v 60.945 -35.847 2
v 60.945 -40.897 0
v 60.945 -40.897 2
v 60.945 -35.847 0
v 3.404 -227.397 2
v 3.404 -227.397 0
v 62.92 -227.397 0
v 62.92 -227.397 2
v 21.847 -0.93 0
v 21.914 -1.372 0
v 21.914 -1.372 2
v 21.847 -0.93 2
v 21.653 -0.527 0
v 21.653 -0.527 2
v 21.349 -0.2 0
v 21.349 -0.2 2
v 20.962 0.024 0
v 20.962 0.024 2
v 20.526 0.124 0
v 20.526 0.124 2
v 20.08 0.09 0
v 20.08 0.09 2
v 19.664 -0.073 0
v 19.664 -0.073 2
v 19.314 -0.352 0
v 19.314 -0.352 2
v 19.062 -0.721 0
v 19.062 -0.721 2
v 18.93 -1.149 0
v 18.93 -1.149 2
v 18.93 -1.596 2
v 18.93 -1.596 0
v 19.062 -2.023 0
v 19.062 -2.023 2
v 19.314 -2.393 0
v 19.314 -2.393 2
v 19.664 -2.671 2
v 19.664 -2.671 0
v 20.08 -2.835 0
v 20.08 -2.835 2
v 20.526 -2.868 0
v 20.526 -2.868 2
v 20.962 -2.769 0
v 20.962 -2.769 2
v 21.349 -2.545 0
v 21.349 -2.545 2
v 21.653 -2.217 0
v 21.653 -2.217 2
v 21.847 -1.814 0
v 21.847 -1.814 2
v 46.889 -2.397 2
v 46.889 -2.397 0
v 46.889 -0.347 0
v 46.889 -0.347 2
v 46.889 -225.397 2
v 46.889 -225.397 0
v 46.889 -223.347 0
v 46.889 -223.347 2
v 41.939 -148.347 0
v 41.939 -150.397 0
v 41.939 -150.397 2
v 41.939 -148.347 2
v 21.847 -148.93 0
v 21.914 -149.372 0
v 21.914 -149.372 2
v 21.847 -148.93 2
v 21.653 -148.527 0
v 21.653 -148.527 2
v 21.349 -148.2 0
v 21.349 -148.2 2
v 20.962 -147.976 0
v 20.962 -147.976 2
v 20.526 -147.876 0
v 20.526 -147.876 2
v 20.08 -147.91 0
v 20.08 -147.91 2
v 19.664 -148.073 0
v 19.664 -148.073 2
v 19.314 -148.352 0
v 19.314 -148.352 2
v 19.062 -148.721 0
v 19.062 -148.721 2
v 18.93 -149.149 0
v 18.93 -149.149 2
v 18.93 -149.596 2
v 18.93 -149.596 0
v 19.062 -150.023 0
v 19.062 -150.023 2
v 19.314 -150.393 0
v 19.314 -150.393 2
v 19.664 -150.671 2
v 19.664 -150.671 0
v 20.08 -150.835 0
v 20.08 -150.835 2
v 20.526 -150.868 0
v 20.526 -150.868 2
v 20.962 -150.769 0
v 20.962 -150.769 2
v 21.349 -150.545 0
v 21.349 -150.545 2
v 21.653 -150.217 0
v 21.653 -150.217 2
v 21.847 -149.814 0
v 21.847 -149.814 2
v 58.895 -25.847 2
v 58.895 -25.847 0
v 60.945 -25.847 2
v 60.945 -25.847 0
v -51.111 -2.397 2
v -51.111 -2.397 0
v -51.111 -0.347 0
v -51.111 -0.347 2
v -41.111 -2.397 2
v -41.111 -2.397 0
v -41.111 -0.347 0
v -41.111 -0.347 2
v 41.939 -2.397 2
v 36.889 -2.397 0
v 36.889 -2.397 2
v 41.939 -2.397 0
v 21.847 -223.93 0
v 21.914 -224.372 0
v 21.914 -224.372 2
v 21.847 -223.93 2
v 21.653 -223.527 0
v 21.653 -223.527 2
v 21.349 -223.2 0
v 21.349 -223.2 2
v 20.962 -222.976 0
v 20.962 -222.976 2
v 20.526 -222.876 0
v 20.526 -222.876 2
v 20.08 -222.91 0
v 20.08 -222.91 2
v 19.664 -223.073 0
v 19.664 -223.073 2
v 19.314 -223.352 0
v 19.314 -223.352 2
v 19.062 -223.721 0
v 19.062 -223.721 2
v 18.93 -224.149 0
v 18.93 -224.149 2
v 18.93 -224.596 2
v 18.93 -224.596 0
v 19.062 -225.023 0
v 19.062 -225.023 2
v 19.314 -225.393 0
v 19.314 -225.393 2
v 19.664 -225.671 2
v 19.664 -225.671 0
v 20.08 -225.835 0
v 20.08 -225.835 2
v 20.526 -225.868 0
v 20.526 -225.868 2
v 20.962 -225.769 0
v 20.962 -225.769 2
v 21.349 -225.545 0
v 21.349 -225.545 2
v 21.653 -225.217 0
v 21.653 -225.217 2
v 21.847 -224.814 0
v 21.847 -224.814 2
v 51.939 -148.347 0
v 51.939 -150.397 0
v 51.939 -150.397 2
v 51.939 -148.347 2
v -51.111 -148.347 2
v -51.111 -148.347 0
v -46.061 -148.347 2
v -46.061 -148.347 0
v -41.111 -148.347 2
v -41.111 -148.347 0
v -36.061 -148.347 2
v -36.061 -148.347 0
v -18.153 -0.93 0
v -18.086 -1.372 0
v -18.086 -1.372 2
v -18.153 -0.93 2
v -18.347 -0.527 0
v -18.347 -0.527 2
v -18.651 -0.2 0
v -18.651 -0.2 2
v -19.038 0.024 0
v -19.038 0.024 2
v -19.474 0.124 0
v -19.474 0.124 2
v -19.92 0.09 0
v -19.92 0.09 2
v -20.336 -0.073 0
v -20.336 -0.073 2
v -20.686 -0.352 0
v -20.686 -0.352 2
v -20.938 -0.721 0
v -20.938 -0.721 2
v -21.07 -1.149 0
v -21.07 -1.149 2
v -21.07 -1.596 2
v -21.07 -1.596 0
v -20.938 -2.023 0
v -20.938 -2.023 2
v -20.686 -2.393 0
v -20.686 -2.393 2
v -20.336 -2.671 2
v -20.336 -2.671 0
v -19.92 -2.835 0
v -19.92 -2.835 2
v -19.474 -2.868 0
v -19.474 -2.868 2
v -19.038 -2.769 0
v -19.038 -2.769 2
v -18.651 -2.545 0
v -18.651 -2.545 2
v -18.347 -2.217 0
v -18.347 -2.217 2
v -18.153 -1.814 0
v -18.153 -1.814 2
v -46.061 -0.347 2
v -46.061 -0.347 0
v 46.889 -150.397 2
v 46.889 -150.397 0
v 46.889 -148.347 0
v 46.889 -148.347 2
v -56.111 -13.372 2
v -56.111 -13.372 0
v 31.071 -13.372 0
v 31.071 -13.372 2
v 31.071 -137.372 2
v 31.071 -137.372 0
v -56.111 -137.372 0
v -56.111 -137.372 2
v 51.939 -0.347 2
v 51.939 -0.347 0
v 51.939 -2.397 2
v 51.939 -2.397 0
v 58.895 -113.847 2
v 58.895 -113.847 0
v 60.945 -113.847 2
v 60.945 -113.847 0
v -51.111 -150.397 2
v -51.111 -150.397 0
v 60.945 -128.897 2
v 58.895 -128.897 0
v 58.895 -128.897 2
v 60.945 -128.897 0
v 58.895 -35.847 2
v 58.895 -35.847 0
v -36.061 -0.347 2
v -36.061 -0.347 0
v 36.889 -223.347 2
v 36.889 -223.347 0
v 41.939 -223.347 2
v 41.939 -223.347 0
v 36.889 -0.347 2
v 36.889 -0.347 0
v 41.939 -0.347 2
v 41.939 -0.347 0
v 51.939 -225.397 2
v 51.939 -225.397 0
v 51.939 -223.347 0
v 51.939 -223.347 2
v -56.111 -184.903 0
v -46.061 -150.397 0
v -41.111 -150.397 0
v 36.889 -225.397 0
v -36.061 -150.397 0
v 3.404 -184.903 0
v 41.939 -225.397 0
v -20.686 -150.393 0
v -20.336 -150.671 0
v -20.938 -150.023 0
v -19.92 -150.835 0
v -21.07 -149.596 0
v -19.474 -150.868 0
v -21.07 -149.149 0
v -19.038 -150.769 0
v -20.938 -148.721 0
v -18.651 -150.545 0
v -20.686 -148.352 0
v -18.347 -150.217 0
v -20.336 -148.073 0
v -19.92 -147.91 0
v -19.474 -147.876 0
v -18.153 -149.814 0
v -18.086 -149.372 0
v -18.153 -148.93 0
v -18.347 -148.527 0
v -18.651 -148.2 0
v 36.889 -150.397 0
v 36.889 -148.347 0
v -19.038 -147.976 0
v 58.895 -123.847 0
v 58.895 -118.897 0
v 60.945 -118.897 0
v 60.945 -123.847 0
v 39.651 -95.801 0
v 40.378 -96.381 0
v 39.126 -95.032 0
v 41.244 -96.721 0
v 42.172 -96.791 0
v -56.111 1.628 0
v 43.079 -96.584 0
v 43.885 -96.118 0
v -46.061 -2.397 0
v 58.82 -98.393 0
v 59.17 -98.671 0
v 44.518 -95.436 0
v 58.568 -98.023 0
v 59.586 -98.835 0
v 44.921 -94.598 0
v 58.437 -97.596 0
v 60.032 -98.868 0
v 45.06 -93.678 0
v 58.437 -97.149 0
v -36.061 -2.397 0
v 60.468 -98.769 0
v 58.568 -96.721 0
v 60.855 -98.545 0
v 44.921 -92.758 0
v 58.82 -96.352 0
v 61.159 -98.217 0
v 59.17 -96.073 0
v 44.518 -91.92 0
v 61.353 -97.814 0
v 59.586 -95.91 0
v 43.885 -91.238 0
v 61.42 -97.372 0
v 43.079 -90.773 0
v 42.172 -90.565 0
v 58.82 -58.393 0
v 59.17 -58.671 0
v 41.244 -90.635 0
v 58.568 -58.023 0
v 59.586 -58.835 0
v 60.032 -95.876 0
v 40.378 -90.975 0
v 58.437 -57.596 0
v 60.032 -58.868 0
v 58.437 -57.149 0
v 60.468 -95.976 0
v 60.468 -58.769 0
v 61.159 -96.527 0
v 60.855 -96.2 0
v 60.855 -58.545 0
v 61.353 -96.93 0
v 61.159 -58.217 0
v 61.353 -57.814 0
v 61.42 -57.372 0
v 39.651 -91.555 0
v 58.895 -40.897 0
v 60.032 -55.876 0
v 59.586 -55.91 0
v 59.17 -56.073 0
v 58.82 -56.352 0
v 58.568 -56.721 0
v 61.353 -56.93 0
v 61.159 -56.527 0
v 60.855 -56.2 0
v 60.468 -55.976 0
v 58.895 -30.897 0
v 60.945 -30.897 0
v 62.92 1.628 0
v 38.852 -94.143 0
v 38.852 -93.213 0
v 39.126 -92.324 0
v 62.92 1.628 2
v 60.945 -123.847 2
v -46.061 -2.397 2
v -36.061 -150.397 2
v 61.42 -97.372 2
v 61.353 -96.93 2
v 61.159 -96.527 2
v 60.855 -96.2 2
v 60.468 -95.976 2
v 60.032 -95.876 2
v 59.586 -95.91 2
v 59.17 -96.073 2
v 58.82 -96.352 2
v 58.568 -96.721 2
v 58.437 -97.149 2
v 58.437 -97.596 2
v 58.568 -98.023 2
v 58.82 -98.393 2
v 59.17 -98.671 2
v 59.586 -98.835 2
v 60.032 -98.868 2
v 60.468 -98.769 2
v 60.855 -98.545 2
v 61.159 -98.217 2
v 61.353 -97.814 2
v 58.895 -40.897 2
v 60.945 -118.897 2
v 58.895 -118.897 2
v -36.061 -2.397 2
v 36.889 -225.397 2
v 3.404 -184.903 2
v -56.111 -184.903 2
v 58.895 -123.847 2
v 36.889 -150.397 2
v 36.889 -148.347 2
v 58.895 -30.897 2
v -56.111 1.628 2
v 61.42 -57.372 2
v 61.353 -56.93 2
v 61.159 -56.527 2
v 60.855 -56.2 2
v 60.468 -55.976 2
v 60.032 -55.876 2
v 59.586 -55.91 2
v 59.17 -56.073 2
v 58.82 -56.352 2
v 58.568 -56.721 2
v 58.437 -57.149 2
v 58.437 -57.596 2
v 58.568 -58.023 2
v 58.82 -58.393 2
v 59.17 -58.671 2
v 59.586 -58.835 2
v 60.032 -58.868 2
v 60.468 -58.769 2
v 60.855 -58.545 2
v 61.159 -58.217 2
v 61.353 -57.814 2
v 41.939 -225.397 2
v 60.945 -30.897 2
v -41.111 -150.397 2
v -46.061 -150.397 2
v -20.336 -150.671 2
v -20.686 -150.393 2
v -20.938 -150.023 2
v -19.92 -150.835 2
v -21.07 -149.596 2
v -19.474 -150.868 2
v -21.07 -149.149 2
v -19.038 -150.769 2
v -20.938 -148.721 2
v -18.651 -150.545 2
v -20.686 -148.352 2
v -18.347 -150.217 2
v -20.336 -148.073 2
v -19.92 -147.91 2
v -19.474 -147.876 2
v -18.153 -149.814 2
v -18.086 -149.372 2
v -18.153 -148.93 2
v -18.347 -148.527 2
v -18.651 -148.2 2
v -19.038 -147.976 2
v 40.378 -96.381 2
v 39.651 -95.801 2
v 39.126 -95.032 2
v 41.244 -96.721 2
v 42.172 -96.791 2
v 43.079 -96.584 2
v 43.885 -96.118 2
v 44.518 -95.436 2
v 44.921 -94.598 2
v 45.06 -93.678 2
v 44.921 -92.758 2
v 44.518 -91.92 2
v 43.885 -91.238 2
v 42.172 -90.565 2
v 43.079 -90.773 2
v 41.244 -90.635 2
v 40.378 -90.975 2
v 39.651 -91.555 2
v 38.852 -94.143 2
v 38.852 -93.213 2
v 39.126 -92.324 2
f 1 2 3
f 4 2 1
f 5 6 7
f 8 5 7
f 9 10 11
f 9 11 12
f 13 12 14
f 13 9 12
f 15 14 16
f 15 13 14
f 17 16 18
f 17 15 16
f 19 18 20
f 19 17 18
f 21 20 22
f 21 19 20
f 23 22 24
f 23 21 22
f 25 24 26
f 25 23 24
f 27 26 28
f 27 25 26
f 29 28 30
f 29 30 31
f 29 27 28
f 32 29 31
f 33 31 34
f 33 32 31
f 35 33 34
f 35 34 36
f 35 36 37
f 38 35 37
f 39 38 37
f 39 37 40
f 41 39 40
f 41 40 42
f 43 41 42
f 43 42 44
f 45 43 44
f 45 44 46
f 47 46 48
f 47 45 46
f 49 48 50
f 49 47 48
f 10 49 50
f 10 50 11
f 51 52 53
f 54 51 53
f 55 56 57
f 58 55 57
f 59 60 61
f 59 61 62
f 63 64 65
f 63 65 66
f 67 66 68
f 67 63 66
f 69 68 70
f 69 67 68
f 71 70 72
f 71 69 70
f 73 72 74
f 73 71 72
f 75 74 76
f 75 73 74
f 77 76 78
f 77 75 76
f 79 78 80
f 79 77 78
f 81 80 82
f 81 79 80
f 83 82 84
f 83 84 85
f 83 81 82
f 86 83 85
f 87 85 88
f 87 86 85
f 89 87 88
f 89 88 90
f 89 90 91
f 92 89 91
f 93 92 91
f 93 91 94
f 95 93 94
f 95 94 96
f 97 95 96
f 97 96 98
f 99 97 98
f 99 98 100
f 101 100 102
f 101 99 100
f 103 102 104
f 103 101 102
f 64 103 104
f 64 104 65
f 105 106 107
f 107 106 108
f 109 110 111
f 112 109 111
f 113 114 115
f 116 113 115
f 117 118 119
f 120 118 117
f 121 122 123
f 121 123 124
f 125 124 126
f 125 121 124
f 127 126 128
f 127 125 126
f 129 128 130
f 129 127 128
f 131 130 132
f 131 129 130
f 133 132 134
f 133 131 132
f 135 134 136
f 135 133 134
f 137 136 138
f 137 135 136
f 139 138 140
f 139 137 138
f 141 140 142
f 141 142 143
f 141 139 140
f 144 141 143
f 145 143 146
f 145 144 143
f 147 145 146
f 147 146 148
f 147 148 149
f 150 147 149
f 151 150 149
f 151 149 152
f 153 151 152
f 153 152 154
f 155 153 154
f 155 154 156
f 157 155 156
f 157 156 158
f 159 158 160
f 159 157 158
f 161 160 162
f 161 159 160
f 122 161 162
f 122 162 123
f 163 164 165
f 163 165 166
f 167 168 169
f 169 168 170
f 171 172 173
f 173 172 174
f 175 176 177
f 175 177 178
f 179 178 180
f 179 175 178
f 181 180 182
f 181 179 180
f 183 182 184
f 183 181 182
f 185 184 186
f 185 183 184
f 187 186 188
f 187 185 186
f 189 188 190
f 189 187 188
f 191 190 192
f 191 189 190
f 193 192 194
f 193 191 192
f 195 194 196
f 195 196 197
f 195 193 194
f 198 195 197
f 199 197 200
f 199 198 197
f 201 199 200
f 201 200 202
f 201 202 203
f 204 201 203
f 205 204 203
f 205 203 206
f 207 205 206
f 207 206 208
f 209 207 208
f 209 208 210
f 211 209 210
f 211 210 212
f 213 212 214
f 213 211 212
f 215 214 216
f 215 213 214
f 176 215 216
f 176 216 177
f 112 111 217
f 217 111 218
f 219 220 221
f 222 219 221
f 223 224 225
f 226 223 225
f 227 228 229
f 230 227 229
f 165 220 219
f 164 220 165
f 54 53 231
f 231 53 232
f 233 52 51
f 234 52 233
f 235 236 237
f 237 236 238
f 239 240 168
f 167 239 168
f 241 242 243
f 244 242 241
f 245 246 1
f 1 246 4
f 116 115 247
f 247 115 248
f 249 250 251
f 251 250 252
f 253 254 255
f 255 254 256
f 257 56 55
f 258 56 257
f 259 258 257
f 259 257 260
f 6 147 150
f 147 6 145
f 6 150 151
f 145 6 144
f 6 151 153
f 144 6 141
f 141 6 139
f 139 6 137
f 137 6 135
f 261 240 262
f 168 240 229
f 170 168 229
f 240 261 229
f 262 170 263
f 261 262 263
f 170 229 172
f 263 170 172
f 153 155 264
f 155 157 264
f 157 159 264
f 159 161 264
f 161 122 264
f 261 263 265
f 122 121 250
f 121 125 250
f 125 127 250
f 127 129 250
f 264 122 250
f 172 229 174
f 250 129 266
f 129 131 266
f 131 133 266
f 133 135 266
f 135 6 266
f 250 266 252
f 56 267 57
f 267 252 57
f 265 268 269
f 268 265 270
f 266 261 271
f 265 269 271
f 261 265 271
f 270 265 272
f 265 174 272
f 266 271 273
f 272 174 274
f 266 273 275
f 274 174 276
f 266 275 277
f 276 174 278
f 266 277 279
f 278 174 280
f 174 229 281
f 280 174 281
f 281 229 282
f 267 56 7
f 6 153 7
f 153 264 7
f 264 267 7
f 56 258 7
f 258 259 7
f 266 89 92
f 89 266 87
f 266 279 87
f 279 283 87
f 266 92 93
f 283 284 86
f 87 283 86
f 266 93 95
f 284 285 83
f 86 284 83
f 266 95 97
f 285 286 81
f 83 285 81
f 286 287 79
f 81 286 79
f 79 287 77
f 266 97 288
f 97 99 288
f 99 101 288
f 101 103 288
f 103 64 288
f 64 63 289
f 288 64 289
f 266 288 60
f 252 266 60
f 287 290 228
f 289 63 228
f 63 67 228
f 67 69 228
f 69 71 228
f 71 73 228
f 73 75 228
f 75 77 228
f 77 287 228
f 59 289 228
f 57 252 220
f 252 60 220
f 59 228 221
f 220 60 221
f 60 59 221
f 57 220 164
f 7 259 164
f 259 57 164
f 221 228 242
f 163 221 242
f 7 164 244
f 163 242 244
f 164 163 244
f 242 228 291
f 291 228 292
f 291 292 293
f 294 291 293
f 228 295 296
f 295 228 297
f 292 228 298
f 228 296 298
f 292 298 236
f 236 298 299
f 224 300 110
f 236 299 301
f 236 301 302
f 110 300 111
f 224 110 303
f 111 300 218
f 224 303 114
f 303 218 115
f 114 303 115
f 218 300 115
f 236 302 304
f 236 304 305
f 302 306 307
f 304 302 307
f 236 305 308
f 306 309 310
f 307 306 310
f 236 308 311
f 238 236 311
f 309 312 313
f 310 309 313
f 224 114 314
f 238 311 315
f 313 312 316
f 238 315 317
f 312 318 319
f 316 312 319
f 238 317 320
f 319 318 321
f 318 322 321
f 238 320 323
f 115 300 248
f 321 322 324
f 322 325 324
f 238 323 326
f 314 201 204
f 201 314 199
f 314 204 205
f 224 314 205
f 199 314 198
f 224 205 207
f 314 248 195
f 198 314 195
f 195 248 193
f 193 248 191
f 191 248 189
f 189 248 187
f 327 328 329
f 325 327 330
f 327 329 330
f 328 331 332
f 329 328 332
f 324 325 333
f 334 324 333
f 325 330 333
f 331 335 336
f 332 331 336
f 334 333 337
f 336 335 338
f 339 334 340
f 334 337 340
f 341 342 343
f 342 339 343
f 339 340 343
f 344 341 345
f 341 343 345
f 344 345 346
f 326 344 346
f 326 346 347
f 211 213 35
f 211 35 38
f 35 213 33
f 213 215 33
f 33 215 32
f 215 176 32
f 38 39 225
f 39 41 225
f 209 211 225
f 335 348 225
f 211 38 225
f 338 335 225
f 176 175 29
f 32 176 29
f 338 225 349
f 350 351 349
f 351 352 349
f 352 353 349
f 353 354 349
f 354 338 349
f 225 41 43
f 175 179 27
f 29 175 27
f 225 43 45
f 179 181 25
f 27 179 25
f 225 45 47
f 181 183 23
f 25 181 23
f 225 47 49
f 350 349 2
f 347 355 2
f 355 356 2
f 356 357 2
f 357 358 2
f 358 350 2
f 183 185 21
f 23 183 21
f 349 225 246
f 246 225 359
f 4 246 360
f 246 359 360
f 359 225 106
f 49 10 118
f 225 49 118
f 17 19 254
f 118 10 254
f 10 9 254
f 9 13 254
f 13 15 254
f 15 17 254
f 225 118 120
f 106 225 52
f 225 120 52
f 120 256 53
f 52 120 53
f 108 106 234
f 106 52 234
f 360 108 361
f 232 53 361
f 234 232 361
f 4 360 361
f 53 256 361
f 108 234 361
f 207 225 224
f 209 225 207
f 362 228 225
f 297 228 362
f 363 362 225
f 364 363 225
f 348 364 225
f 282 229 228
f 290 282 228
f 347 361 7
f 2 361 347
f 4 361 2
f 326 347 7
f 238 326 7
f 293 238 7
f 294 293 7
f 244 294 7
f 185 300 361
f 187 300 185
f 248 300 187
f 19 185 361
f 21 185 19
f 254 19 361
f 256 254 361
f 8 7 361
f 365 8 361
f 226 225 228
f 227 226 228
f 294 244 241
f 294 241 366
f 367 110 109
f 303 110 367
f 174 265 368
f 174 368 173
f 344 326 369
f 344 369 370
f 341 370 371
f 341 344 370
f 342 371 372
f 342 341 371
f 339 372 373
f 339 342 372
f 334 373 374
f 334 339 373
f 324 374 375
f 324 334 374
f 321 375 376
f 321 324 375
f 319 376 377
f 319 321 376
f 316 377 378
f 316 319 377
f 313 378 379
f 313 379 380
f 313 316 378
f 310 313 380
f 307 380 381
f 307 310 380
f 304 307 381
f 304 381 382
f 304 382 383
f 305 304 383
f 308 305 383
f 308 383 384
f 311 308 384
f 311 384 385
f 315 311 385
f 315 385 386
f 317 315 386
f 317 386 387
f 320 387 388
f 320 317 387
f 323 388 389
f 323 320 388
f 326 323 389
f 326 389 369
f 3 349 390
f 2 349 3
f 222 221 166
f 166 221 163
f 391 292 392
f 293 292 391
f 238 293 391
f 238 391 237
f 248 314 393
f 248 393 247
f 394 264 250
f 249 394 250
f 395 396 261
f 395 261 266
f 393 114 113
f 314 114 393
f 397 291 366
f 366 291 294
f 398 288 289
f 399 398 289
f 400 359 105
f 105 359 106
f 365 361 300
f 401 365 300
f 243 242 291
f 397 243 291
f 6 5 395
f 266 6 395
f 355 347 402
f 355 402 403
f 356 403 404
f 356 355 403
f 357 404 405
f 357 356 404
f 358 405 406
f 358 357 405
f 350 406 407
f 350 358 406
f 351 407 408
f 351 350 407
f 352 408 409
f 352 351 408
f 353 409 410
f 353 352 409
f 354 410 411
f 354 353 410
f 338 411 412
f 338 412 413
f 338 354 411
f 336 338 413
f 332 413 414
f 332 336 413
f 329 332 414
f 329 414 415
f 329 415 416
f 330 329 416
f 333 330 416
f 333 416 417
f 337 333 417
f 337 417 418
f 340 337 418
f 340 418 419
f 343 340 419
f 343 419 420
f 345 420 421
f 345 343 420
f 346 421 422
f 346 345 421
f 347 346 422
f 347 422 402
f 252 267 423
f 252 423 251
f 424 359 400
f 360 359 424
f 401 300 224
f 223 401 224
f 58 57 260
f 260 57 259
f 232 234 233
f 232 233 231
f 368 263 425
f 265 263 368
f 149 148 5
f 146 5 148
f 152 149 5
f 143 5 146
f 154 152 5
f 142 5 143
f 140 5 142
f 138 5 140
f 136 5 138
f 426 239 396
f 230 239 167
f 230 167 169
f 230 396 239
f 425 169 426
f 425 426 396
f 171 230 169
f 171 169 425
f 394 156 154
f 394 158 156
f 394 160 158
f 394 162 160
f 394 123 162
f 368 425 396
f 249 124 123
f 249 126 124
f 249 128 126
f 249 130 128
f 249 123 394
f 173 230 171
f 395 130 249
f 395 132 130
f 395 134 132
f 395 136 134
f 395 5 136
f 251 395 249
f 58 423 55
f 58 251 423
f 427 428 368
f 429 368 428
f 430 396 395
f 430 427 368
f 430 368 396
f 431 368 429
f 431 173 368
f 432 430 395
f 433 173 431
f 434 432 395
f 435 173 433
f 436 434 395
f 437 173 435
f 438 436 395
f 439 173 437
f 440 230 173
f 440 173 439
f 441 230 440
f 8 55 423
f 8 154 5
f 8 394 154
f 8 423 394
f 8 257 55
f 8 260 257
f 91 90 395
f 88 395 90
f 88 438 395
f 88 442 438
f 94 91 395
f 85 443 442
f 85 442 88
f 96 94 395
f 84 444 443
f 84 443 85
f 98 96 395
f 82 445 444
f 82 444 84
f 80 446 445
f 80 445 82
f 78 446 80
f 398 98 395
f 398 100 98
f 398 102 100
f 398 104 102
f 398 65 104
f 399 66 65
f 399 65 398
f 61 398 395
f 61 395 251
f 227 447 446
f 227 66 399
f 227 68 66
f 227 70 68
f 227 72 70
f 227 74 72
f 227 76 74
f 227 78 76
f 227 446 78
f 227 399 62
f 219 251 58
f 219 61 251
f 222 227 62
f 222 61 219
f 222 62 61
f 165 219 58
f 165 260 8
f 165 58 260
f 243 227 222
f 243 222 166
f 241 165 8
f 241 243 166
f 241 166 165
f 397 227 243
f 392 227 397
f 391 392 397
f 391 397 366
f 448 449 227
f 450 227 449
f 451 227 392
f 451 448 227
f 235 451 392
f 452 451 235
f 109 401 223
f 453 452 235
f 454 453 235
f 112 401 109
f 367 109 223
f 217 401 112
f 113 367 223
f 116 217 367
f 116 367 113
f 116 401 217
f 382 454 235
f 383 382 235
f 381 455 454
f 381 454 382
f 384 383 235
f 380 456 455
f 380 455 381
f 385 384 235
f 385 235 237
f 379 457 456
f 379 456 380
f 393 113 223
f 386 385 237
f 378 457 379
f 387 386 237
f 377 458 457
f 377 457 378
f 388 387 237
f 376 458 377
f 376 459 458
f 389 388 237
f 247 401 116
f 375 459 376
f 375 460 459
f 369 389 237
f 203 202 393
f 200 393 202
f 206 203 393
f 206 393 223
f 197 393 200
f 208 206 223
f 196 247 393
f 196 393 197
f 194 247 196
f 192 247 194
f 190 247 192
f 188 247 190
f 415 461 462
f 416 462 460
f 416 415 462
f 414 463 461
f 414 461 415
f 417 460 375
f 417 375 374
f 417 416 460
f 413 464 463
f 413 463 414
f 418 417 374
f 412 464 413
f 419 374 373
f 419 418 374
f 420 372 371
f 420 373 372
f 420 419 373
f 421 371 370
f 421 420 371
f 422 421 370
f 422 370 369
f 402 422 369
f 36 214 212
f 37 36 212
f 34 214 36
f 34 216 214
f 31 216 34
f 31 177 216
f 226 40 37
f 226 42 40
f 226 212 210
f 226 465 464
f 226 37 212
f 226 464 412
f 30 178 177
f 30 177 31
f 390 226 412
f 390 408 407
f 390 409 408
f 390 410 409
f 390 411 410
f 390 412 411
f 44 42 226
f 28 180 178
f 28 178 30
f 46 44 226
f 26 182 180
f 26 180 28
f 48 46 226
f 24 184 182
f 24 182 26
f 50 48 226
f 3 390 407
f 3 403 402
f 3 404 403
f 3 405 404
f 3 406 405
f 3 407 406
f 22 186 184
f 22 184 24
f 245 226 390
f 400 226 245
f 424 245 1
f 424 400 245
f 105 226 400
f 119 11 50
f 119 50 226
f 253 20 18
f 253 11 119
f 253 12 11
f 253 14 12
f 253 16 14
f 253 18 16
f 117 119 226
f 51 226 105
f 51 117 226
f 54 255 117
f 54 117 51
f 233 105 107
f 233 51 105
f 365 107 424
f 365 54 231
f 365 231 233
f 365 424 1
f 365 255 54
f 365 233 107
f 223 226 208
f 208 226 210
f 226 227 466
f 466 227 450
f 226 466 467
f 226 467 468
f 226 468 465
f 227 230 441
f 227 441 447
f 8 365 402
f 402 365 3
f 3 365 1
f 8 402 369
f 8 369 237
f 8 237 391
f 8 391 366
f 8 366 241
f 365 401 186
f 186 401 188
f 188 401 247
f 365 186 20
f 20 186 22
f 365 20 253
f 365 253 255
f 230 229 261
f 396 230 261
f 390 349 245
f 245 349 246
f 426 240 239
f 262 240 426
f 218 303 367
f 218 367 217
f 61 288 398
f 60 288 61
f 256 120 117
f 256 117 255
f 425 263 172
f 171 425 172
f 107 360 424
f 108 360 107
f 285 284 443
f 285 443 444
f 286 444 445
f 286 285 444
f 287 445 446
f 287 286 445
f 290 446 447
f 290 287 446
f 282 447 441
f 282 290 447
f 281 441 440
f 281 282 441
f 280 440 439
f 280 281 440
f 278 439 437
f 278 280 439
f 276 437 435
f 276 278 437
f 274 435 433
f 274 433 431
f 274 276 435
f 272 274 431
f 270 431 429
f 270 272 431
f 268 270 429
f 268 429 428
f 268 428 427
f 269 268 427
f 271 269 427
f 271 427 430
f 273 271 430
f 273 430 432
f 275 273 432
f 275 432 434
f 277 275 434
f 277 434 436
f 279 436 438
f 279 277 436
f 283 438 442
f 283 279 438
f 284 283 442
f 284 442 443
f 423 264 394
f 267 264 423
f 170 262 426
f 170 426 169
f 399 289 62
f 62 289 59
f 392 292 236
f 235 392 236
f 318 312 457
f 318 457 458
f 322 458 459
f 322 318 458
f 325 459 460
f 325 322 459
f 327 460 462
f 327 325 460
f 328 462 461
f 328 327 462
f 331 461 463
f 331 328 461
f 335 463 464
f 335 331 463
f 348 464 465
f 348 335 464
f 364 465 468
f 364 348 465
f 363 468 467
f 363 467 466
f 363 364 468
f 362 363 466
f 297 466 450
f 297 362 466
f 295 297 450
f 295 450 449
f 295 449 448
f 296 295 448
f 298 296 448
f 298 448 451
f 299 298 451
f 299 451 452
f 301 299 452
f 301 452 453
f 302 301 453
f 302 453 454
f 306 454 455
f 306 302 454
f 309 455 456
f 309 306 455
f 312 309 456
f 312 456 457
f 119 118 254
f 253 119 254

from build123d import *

# Parameters (mm, degrees)
SKETCH_1_R          = 1.5
SKETCH_1_R_2        = 3.121318996
SKETCH_1_W          = 5.05
SKETCH_1_H          = 2.05
SKETCH_1_W_2        = 2.05
SKETCH_1_H_2        = 5.05
EXTRUDE_1_DEPTH     = 2
SKETCH_2_W          = 59.515578234
SKETCH_2_H          = 42.494416296
CUT_EXTRUDE_1_DEPTH = 10


with BuildPart() as part:
    # 草图1 → 凸台-拉伸1 (new body)
    with BuildSketch(Plane.XY):
        Polygon((-56.111334712, -13.372248853), (31.071025228, -13.372248853), (31.071025228, -137.372248853), (-56.111334712, -137.372248853), (-56.111334712, -152.372248853), (-56.111334712, -227.397248853), (62.919821756, -227.397248853), (62.919821756, -152.372248853), (62.919821756, 1.627751147), (-56.111334712, 1.627751147), align=None)
        with Locations((-19.586334712, -1.372248853)):
            Circle(SKETCH_1_R, mode=Mode.SUBTRACT)
        with Locations((20.413665288, -1.372248853)):
            Circle(SKETCH_1_R, mode=Mode.SUBTRACT)
        with Locations((-19.586334712, -149.372248853)):
            Circle(SKETCH_1_R, mode=Mode.SUBTRACT)
        with Locations((20.413665288, -149.372248853)):
            Circle(SKETCH_1_R, mode=Mode.SUBTRACT)
        with Locations((59.919821756, -97.372248853)):
            Circle(SKETCH_1_R, mode=Mode.SUBTRACT)
        with Locations((59.919821756, -57.372248853)):
            Circle(SKETCH_1_R, mode=Mode.SUBTRACT)
        with Locations((41.938665288, -93.678088908)):
            Circle(SKETCH_1_R_2, mode=Mode.SUBTRACT)
        with Locations((-19.586334712, -224.372248853)):
            Circle(SKETCH_1_R, mode=Mode.SUBTRACT)
        with Locations((20.413665288, -224.372248853)):
            Circle(SKETCH_1_R, mode=Mode.SUBTRACT)
        with Locations((39.413665288, -1.372248853)):
            Rectangle(SKETCH_1_W, SKETCH_1_H, mode=Mode.SUBTRACT)
        with Locations((49.413665288, -1.372248853)):
            Rectangle(SKETCH_1_W, SKETCH_1_H, mode=Mode.SUBTRACT)
        with Locations((-48.586334712, -1.372248853)):
            Rectangle(SKETCH_1_W, SKETCH_1_H, mode=Mode.SUBTRACT)
        with Locations((-38.586334712, -1.372248853)):
            Rectangle(SKETCH_1_W, SKETCH_1_H, mode=Mode.SUBTRACT)
        with Locations((39.413665288, -149.372248853)):
            Rectangle(SKETCH_1_W, SKETCH_1_H, mode=Mode.SUBTRACT)
        with Locations((49.413665288, -149.372248853)):
            Rectangle(SKETCH_1_W, SKETCH_1_H, mode=Mode.SUBTRACT)
        with Locations((-48.586334712, -149.372248853)):
            Rectangle(SKETCH_1_W, SKETCH_1_H, mode=Mode.SUBTRACT)
        with Locations((-38.586334712, -149.372248853)):
            Rectangle(SKETCH_1_W, SKETCH_1_H, mode=Mode.SUBTRACT)
        with Locations((59.919821756, -38.372248853)):
            Rectangle(SKETCH_1_W_2, SKETCH_1_H_2, mode=Mode.SUBTRACT)
        with Locations((59.919821756, -28.372248853)):
            Rectangle(SKETCH_1_W_2, SKETCH_1_H_2, mode=Mode.SUBTRACT)
        with Locations((59.919821756, -126.372248853)):
            Rectangle(SKETCH_1_W_2, SKETCH_1_H_2, mode=Mode.SUBTRACT)
        with Locations((59.919821756, -116.372248853)):
            Rectangle(SKETCH_1_W_2, SKETCH_1_H_2, mode=Mode.SUBTRACT)
        with Locations((39.413665288, -224.372248853)):
            Rectangle(SKETCH_1_W, SKETCH_1_H, mode=Mode.SUBTRACT)
        with Locations((49.413665288, -224.372248853)):
            Rectangle(SKETCH_1_W, SKETCH_1_H, mode=Mode.SUBTRACT)
        with Locations((-48.586334712, -224.372248853)):
            Rectangle(SKETCH_1_W, SKETCH_1_H, mode=Mode.SUBTRACT)
        with Locations((-38.586334712, -224.372248853)):
            Rectangle(SKETCH_1_W, SKETCH_1_H, mode=Mode.SUBTRACT)
    extrude(amount=EXTRUDE_1_DEPTH)

    # 草图2 → 切除-拉伸1 (cut)
    with BuildSketch(Plane.XY.offset(2)):
        with Locations((-26.353545595, -206.150040705)):
            Rectangle(SKETCH_2_W, SKETCH_2_H)
    extrude(amount=-CUT_EXTRUDE_1_DEPTH, mode=Mode.SUBTRACT)


solid = part.part
